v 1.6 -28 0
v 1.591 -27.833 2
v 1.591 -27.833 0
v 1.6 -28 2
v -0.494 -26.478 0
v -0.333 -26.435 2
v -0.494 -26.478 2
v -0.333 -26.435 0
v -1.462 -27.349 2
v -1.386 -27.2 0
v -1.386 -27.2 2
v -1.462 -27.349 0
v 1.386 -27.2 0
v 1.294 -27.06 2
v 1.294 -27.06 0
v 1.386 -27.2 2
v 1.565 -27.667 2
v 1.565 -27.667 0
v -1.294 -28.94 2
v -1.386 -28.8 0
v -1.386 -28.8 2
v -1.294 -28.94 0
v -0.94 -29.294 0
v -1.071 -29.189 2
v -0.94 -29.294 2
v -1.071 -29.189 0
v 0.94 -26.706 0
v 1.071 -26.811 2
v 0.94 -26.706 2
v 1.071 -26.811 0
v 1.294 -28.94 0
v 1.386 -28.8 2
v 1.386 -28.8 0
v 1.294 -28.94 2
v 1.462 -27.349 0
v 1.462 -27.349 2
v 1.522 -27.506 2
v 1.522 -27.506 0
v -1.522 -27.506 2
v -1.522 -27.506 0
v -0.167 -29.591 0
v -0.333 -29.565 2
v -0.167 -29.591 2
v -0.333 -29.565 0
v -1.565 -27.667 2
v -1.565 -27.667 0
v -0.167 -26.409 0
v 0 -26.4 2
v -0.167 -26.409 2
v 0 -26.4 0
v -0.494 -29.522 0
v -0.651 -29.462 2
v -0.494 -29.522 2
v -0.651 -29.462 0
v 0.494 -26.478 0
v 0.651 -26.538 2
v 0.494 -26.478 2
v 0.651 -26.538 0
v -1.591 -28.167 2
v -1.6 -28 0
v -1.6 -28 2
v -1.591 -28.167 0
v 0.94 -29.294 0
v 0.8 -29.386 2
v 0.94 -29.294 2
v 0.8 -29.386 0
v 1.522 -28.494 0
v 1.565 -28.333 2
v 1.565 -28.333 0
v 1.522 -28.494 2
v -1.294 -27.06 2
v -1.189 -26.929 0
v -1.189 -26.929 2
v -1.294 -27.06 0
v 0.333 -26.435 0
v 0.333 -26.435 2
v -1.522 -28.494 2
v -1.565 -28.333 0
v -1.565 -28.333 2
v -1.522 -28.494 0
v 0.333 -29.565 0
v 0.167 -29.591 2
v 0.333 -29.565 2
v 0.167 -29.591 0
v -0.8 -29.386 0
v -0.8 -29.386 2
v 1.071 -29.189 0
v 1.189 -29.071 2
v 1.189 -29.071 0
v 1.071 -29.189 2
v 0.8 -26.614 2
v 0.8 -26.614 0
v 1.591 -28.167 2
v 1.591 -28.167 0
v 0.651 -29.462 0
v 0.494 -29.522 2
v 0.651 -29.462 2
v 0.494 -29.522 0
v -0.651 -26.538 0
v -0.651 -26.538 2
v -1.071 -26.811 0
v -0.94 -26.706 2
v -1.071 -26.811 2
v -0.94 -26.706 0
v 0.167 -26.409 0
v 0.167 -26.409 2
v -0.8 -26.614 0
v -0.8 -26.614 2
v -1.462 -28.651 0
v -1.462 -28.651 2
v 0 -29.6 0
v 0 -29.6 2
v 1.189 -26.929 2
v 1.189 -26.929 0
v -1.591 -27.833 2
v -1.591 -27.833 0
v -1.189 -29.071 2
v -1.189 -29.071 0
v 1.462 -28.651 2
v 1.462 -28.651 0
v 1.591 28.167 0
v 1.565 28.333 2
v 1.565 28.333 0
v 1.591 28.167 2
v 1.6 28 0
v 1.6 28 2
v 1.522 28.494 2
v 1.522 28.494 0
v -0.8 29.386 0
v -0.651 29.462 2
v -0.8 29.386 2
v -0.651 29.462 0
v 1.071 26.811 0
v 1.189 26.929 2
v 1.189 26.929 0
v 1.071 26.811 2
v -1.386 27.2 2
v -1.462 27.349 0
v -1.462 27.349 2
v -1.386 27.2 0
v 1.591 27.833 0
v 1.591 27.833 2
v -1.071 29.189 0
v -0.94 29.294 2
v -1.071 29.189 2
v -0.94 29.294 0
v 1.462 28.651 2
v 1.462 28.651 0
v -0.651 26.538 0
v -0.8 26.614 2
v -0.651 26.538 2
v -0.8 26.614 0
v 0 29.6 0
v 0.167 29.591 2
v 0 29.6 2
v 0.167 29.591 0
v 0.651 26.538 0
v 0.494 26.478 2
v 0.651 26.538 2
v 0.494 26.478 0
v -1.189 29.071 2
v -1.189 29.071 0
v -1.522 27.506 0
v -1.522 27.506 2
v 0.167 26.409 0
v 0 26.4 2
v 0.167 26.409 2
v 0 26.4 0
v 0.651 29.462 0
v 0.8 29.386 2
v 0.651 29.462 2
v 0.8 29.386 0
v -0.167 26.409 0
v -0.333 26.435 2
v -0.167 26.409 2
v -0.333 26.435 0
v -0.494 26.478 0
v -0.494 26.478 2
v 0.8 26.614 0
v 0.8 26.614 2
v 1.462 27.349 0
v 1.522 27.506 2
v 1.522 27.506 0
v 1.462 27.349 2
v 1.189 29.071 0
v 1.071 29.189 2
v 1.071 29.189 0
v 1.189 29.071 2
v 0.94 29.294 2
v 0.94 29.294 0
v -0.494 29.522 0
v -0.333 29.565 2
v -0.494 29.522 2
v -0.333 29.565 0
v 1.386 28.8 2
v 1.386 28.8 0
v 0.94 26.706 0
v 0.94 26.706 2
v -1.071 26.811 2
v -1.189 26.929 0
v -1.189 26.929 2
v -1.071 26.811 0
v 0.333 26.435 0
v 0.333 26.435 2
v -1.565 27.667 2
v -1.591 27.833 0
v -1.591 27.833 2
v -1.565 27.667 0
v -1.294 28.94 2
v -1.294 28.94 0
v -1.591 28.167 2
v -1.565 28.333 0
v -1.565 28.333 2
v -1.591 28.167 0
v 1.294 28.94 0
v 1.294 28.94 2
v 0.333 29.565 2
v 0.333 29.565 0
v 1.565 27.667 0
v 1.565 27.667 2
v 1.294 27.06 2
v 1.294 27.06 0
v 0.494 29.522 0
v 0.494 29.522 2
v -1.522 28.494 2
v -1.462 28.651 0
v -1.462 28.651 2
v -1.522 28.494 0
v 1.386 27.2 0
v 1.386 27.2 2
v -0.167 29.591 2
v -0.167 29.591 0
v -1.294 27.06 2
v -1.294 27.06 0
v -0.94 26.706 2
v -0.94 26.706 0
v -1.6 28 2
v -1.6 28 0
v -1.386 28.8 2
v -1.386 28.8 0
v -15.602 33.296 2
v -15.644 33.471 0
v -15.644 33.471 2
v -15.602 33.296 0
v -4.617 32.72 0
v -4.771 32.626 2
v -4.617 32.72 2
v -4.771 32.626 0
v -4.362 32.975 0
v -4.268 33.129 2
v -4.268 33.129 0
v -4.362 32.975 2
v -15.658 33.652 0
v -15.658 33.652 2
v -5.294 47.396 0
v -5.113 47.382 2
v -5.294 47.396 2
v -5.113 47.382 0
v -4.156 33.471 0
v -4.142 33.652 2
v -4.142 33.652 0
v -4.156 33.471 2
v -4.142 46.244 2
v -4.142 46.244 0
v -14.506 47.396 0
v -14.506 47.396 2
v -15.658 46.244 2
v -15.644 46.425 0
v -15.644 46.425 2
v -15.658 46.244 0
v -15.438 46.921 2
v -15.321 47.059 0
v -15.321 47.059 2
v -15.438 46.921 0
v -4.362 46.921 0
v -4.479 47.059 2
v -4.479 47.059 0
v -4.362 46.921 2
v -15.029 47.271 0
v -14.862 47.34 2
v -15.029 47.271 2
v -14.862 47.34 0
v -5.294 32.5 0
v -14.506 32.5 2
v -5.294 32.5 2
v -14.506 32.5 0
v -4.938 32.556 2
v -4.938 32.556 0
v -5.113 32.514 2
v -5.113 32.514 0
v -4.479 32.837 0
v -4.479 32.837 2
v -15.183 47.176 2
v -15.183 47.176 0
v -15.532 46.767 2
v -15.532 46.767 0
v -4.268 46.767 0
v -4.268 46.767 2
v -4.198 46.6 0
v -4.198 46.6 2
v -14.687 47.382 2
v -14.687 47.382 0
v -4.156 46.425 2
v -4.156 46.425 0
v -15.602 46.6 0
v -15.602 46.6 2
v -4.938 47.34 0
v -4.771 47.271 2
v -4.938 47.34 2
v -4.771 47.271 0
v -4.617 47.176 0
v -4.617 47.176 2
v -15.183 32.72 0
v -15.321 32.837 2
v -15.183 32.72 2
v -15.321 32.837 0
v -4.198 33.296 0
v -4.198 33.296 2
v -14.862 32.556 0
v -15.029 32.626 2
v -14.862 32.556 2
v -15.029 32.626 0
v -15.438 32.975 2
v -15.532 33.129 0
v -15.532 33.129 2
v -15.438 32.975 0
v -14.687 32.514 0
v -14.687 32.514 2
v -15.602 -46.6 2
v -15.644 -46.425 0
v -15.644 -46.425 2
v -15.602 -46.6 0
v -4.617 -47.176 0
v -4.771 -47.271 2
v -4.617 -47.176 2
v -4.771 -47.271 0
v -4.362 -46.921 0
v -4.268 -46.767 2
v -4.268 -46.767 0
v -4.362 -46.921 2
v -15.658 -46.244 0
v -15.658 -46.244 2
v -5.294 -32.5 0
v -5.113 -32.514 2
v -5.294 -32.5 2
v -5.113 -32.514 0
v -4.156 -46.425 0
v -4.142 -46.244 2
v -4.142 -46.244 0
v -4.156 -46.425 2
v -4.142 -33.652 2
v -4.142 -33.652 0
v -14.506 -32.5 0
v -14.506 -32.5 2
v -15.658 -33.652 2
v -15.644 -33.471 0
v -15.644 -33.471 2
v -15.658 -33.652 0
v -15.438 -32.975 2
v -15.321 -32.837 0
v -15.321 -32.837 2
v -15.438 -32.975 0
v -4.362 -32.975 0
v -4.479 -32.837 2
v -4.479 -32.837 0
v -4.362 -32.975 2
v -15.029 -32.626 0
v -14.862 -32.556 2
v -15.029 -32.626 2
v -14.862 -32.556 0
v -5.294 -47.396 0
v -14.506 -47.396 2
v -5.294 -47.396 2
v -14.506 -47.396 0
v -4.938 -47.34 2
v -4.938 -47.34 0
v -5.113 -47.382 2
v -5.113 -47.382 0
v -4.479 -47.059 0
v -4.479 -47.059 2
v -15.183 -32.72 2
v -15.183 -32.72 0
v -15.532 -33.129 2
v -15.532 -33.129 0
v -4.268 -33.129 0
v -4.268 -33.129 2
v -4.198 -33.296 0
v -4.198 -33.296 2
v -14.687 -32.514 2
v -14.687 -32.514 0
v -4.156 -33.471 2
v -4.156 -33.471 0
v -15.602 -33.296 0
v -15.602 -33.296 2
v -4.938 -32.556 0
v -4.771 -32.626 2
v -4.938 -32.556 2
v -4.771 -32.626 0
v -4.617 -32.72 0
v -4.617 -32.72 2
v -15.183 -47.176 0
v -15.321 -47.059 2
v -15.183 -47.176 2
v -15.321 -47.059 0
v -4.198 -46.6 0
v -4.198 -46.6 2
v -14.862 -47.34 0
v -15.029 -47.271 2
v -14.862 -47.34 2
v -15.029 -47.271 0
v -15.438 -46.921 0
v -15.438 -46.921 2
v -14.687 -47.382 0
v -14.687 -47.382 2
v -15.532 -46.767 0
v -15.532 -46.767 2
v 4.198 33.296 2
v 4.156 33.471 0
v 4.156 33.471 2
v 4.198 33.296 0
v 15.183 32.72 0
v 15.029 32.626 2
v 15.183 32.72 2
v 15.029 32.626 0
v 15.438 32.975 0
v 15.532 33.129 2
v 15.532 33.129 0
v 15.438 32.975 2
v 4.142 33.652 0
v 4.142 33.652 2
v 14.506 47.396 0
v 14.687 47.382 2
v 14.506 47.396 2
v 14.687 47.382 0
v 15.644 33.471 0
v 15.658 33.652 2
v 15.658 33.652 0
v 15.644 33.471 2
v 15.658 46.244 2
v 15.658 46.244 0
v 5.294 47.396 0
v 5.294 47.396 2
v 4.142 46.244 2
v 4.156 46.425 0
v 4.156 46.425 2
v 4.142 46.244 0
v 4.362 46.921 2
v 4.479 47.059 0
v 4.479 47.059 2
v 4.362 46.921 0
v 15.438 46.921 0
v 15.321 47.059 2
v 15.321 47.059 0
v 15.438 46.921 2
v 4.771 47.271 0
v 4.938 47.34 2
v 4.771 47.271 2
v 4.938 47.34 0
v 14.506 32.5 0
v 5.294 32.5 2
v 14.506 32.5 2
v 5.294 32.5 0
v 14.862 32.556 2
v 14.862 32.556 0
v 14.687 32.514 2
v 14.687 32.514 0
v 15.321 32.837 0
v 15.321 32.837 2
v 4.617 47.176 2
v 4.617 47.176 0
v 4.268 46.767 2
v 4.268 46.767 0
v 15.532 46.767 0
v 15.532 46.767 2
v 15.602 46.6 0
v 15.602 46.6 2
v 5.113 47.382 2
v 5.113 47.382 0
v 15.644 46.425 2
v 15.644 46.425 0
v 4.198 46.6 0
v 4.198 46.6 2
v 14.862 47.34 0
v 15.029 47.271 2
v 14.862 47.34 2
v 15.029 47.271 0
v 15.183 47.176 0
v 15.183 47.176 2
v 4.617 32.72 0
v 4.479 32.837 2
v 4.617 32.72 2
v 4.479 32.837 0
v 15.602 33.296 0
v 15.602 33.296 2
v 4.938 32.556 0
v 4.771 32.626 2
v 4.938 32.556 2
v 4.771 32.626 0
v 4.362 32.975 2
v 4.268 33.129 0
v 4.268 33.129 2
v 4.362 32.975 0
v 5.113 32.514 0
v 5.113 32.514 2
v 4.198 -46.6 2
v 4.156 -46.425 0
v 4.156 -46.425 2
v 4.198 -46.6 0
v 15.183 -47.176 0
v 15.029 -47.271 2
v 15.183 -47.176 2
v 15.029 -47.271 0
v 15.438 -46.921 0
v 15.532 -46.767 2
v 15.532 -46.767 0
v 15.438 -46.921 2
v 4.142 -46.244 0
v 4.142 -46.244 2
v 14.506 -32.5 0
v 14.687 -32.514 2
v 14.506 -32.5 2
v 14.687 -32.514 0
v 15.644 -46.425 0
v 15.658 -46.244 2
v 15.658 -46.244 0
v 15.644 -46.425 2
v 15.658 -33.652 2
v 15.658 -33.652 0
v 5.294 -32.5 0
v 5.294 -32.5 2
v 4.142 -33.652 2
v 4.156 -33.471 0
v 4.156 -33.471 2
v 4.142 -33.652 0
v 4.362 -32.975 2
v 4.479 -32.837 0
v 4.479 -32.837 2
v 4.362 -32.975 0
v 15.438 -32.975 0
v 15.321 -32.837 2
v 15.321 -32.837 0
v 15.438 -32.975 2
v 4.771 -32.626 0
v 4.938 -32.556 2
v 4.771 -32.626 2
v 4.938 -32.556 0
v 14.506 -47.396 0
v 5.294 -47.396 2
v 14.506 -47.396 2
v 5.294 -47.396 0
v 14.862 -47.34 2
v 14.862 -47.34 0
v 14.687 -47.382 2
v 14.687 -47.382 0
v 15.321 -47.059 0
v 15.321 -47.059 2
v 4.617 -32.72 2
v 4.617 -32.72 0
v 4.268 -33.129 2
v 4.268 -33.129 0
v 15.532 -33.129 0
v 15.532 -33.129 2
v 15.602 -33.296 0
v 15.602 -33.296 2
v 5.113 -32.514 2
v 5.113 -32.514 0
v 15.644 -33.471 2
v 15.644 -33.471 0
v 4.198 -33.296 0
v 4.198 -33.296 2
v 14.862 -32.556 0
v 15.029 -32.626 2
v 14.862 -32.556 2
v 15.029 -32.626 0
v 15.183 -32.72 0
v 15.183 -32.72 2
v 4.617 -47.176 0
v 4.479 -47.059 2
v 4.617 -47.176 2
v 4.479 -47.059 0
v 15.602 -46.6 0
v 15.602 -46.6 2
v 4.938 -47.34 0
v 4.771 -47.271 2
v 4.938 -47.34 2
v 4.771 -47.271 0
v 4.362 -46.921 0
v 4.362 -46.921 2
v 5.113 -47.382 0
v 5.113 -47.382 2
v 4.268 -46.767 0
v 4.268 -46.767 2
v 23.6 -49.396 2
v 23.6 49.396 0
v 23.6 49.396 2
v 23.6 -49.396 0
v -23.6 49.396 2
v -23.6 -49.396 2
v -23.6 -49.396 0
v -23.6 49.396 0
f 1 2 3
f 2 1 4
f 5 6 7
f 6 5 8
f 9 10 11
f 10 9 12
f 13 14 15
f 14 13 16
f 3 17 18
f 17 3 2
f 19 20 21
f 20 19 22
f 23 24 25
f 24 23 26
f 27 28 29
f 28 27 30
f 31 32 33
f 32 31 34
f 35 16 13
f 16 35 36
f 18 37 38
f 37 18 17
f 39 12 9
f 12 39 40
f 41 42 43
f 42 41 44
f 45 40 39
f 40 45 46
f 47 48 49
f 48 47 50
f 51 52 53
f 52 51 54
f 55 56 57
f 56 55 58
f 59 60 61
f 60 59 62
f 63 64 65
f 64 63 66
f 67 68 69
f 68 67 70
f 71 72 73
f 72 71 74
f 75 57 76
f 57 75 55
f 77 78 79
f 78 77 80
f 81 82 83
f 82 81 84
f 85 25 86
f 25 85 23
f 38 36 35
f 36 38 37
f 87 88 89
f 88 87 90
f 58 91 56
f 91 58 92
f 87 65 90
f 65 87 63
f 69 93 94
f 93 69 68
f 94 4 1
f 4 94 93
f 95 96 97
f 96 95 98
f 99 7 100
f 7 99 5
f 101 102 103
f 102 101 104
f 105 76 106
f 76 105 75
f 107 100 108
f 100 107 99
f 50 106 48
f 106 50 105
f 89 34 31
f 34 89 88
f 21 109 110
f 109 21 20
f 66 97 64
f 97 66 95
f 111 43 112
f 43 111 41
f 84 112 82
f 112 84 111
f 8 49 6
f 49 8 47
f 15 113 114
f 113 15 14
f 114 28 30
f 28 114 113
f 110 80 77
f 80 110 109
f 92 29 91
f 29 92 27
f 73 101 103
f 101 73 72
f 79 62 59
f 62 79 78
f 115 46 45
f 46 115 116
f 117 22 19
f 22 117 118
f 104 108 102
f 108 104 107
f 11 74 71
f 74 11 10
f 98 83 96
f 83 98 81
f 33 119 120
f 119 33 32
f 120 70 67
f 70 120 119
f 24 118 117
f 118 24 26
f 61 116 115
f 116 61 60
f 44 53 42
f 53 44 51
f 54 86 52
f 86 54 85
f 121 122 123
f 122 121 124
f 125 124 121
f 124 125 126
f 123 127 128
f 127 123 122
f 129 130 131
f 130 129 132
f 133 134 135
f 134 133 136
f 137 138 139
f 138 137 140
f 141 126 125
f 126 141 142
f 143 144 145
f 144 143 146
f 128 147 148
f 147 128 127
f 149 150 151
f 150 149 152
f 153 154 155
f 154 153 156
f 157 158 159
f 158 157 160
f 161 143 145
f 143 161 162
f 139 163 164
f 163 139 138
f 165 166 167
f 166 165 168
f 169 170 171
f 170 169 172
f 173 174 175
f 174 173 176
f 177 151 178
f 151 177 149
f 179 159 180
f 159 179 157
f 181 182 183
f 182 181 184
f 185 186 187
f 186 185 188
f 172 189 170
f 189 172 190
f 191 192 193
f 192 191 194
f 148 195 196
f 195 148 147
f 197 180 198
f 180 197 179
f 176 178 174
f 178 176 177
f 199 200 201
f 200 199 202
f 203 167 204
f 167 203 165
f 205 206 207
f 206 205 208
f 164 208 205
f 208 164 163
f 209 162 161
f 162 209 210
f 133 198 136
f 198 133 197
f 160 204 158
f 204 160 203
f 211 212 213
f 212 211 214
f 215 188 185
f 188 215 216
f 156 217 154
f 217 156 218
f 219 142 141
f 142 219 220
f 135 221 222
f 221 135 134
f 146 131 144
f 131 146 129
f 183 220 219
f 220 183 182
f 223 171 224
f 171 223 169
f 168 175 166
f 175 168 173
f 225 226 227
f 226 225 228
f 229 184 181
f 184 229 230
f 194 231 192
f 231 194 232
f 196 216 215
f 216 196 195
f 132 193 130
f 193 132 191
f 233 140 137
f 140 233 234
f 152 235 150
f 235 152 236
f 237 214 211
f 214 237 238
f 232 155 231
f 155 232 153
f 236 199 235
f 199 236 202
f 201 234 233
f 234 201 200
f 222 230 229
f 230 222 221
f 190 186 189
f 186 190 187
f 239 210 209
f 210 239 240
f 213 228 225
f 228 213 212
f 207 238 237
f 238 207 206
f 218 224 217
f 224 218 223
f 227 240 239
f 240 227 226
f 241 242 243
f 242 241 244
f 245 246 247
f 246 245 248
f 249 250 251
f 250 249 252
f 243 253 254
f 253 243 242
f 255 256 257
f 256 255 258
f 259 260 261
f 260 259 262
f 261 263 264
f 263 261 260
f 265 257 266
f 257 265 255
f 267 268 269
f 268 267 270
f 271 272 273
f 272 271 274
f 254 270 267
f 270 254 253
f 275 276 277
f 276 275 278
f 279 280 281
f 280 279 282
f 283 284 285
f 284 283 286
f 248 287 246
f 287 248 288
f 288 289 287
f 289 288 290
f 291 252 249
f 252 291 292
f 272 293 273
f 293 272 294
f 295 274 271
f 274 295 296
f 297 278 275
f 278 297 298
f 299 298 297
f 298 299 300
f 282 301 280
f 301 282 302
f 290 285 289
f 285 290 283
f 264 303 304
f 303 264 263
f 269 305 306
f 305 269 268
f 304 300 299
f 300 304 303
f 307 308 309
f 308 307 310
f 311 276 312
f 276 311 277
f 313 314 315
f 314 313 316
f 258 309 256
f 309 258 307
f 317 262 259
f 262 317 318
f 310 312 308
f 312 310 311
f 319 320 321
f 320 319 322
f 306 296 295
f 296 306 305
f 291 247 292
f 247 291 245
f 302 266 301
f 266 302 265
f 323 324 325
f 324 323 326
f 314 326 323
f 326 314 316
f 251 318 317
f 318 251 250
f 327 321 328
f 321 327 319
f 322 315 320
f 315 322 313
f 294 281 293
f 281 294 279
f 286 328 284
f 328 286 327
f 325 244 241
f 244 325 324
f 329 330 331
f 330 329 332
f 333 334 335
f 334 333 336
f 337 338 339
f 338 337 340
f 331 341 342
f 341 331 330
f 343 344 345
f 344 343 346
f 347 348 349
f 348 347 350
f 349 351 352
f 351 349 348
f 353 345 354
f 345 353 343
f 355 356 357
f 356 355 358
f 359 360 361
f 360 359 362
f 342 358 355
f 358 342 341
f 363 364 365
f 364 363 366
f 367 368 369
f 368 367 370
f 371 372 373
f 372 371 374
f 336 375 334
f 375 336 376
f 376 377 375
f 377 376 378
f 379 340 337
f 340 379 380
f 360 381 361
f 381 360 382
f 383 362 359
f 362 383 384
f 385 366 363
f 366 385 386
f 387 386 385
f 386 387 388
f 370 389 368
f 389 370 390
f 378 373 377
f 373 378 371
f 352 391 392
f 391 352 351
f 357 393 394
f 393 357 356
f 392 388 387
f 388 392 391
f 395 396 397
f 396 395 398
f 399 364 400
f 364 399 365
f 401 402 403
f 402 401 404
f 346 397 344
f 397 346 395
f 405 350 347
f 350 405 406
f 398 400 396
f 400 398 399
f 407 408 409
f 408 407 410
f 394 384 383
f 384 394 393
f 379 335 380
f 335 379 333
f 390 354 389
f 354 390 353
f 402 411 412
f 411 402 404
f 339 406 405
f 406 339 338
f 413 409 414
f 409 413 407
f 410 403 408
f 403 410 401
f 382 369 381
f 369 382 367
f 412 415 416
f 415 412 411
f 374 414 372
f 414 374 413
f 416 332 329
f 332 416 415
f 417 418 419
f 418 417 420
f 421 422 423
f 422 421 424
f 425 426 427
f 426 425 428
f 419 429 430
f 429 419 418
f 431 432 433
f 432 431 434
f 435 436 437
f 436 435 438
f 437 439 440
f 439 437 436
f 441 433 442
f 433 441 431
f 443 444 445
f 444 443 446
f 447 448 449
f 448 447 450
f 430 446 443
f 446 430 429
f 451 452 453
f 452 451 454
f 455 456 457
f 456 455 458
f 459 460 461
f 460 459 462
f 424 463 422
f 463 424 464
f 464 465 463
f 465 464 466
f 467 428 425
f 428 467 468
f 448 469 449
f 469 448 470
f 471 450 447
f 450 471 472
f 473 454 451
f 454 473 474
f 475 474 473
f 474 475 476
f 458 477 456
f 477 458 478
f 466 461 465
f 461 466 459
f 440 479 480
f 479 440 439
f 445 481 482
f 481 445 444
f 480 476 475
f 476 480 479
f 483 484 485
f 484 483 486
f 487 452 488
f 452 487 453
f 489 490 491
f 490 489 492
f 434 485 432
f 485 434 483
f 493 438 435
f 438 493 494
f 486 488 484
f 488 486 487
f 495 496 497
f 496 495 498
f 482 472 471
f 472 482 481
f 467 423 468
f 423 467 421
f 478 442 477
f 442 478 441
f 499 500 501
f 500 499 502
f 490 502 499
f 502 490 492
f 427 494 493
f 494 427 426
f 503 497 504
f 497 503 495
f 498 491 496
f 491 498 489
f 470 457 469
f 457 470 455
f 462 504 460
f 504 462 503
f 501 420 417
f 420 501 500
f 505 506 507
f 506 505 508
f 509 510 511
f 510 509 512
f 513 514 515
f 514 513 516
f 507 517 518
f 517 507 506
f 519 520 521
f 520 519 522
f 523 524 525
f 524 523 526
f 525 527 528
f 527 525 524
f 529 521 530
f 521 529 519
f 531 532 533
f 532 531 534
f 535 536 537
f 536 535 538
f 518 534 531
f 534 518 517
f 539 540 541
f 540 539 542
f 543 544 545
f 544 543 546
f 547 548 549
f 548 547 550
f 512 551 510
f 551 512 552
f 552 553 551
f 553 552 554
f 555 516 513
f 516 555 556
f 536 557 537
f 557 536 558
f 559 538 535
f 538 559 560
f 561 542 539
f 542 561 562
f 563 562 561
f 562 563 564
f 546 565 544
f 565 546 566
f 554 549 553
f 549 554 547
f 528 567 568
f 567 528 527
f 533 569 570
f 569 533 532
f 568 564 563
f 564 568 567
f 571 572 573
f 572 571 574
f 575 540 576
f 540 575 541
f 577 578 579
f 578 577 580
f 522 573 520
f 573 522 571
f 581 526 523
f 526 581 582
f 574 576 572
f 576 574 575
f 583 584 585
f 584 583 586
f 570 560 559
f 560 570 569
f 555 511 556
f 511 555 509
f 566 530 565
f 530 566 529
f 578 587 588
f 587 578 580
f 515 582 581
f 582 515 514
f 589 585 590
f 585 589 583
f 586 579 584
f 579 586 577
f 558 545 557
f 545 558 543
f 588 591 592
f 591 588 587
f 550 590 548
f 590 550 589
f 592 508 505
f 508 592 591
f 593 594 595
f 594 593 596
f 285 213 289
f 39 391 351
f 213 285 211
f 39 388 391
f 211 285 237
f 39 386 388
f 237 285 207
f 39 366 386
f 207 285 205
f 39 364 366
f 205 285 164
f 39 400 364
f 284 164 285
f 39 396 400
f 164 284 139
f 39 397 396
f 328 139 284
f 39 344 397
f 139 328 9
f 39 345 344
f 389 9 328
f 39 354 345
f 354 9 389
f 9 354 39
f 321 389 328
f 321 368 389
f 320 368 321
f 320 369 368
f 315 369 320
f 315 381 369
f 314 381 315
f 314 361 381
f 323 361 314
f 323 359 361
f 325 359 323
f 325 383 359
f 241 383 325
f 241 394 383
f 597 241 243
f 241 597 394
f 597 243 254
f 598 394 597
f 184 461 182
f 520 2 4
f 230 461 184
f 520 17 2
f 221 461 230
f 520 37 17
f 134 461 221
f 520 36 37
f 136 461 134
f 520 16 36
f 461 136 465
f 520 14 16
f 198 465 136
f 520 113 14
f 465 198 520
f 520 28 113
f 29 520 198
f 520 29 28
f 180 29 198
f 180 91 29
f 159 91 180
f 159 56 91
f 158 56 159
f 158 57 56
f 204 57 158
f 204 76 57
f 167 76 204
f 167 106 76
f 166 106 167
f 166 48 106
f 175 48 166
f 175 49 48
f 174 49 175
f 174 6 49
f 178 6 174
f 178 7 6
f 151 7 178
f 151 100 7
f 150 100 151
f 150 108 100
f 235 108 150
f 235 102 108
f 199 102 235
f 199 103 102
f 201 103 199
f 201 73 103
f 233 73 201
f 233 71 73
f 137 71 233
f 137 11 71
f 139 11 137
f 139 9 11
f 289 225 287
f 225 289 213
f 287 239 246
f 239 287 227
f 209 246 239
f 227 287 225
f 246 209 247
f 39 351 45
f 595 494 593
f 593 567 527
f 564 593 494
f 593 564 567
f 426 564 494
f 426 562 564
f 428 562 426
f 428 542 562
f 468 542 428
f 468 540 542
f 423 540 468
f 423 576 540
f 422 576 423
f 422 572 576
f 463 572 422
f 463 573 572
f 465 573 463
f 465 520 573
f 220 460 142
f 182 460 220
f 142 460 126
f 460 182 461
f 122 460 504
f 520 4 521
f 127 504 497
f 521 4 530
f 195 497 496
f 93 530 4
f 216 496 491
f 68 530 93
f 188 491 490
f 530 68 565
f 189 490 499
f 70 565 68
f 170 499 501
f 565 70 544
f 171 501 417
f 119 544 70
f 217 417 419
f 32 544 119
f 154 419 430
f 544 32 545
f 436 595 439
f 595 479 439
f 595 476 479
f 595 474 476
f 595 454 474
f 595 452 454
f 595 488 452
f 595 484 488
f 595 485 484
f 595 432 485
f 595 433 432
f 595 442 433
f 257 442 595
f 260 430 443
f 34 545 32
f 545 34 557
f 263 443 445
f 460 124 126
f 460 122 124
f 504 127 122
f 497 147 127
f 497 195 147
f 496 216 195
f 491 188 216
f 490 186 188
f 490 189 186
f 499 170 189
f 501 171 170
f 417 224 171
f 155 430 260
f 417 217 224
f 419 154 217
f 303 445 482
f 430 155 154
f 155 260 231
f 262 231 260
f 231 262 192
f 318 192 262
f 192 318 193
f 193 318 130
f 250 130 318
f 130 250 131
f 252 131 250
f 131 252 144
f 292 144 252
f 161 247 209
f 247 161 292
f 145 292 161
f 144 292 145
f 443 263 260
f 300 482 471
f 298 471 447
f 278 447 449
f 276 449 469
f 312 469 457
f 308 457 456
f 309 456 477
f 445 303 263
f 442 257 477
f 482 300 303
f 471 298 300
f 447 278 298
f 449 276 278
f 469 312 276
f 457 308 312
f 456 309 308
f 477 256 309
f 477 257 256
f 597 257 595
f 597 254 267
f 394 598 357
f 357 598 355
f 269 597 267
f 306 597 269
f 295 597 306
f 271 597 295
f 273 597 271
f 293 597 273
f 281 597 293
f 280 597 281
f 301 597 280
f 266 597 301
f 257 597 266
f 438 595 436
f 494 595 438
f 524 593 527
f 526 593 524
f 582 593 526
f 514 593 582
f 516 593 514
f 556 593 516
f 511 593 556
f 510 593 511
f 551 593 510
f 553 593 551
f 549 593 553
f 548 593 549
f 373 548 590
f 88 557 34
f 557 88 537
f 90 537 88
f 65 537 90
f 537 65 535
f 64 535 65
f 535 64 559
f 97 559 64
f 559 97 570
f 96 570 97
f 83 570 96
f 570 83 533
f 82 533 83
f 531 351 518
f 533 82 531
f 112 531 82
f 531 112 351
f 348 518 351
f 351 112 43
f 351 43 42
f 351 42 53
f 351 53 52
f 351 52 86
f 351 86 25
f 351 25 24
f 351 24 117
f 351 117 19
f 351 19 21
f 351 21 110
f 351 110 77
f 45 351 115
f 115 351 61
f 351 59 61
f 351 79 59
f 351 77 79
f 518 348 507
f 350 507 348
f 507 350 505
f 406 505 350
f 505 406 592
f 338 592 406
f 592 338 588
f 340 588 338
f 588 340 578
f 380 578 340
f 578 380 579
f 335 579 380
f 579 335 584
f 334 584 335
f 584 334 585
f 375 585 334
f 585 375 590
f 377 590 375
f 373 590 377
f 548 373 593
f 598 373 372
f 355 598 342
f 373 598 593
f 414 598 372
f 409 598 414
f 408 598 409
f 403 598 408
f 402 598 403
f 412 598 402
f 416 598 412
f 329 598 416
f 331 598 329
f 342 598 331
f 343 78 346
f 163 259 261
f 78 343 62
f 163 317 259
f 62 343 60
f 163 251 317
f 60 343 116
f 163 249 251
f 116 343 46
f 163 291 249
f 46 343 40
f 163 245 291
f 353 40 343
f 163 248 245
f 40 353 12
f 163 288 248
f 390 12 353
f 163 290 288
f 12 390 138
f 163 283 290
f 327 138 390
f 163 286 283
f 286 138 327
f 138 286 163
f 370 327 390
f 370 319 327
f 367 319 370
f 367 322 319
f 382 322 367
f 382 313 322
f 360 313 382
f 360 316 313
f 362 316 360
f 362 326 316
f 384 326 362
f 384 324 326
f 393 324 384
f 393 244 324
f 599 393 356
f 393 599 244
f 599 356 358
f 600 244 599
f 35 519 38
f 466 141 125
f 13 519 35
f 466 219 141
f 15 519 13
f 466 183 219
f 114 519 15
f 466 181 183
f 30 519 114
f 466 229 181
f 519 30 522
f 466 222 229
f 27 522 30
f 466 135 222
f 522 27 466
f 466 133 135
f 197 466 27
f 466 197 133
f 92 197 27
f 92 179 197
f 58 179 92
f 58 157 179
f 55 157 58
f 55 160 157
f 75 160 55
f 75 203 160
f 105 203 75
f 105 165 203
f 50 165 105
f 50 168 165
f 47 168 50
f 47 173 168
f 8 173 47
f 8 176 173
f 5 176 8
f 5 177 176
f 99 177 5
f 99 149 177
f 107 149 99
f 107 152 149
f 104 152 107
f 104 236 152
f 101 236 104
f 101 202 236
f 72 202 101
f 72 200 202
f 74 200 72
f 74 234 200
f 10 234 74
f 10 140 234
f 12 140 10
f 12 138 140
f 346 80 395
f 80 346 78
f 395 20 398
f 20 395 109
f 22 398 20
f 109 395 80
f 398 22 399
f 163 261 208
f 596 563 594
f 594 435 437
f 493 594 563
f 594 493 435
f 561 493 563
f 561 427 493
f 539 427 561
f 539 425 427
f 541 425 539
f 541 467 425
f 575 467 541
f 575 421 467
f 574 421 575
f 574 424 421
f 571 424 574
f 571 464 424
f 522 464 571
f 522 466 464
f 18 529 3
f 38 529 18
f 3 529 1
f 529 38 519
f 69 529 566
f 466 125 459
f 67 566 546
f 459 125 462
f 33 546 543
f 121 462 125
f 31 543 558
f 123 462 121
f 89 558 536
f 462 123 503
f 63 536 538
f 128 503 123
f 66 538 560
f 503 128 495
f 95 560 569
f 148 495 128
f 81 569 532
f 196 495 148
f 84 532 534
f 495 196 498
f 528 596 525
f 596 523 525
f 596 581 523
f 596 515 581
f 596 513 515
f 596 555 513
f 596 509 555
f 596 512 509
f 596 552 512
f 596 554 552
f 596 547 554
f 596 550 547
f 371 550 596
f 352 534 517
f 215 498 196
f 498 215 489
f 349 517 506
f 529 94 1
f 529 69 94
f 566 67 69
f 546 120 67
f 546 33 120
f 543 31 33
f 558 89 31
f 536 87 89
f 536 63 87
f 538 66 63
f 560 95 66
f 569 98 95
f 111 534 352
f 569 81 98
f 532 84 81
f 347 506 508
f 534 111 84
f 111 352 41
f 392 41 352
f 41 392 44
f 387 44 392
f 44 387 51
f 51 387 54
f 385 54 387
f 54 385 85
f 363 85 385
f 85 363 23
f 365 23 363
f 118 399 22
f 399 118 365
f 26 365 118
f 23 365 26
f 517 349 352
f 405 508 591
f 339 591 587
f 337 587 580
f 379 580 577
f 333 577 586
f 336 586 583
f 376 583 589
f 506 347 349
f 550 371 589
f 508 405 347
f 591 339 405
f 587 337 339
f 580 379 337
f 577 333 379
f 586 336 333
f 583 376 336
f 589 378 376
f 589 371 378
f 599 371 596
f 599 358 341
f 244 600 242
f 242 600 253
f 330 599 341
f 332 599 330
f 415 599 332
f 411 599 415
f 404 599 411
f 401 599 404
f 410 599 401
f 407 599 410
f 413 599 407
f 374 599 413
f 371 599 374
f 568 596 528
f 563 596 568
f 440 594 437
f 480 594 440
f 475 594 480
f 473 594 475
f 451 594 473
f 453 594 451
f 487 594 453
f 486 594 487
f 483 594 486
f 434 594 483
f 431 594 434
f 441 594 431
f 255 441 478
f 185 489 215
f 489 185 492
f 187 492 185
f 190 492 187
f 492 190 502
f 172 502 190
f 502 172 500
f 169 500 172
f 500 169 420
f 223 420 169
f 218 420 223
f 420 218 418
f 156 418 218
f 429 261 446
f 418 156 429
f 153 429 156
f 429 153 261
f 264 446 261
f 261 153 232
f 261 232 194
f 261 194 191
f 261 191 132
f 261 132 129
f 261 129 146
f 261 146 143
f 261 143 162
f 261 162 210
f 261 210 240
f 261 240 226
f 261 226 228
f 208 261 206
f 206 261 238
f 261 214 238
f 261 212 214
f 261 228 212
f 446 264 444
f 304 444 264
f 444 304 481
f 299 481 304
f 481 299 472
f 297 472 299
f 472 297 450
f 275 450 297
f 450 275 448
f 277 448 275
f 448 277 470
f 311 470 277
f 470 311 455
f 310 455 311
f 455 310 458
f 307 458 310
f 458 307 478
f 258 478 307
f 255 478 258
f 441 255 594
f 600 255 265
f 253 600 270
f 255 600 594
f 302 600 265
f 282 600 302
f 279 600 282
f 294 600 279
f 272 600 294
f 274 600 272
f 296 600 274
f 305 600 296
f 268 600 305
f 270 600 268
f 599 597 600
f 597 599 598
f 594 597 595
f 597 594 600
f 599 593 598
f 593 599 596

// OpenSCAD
include <../../colors.scad>
include <../../parameters.scad>

use <../../lib/shapes3d.scad>
use <battery_holder.scad>

// Where mounting holes are placed
panel_mount_type                 = "intercell"; // [under_cell: Under each cell, intercell: Between the cells]

contact_terminal_type            = "solder_tab"; // [coil_spring: Circular contact with a helical spring, solder_tab: Squared external connection-style tabs]

side_wall_cutout_type            = "skeleton"; // [enclosed: Enclosed, skeleton: Skeleton]

/* [Solder tab parameters] */
tab_contact_slot_default_pad_len = 5;
tab_contact_slot_default_pad_w   = 5;
tab_contact_default_hole_d       = 1;

// Number of batteries to use
batteries_count                  = 2; // [0:1:6]

bolt_dia                         = battery_holder_bolt_dia;
bolt_spacing                     = battery_holder_bolt_spacing;

slot_thickness                   = 2;

panel_padding                    = 2;

module probe_panel(tab_contact_hole_d=tab_contact_default_hole_d,
                   tab_contact_slot_pad_len=tab_contact_slot_default_pad_len,
                   tab_contact_slot_pad_w=tab_contact_slot_default_pad_w,
                   battery_dia=battery_dia,
                   battery_len=battery_length,
                   terminal_type=contact_terminal_type,
                   side_wall_type=side_wall_cutout_type,
                   mount_type=panel_mount_type,
                   side_thickness=battery_holder_side_thickness,
                   front_rear_thickness=battery_holder_front_rear_thickness,
                   slot_thickness=slot_thickness,
                   panel_padding=panel_padding,
                   bolt_dia=bolt_dia,
                   count=batteries_count,
                   bolt_spacing=bolt_spacing,
                   inner_thickness=battery_holder_inner_thickness) {
  full_size = battery_holder_full_size(inner_thickness=inner_thickness,
                                       side_thickness=side_thickness,
                                       count=count,
                                       front_rear_thickness=front_rear_thickness,
                                       battery_dia=battery_dia,
                                       battery_len=battery_len,
                                       terminal_type=terminal_type,
                                       contact_hole_d=tab_contact_hole_d,
                                       tab_contact_slot_pad_len=tab_contact_slot_pad_len);
  panel_size = [full_size[0] + panel_padding * 2,
                full_size[1] + panel_padding * 2,
                slot_thickness];
  difference() {
    cuboid(panel_size);
    battery_holder(tab_contact_hole_d=tab_contact_hole_d,
                   tab_contact_slot_pad_len=tab_contact_slot_pad_len,
                   tab_contact_slot_pad_w=tab_contact_slot_pad_w,
                   terminal_type=terminal_type,
                   side_wall_type=side_wall_type,
                   mount_type=mount_type,
                   count=count,
                   bolt_dia=bolt_dia,
                   bolt_spacing=bolt_spacing,
                   slot_thickness=slot_thickness,
                   slot_mode=true,
                   center=true);
  }
}

probe_panel();
